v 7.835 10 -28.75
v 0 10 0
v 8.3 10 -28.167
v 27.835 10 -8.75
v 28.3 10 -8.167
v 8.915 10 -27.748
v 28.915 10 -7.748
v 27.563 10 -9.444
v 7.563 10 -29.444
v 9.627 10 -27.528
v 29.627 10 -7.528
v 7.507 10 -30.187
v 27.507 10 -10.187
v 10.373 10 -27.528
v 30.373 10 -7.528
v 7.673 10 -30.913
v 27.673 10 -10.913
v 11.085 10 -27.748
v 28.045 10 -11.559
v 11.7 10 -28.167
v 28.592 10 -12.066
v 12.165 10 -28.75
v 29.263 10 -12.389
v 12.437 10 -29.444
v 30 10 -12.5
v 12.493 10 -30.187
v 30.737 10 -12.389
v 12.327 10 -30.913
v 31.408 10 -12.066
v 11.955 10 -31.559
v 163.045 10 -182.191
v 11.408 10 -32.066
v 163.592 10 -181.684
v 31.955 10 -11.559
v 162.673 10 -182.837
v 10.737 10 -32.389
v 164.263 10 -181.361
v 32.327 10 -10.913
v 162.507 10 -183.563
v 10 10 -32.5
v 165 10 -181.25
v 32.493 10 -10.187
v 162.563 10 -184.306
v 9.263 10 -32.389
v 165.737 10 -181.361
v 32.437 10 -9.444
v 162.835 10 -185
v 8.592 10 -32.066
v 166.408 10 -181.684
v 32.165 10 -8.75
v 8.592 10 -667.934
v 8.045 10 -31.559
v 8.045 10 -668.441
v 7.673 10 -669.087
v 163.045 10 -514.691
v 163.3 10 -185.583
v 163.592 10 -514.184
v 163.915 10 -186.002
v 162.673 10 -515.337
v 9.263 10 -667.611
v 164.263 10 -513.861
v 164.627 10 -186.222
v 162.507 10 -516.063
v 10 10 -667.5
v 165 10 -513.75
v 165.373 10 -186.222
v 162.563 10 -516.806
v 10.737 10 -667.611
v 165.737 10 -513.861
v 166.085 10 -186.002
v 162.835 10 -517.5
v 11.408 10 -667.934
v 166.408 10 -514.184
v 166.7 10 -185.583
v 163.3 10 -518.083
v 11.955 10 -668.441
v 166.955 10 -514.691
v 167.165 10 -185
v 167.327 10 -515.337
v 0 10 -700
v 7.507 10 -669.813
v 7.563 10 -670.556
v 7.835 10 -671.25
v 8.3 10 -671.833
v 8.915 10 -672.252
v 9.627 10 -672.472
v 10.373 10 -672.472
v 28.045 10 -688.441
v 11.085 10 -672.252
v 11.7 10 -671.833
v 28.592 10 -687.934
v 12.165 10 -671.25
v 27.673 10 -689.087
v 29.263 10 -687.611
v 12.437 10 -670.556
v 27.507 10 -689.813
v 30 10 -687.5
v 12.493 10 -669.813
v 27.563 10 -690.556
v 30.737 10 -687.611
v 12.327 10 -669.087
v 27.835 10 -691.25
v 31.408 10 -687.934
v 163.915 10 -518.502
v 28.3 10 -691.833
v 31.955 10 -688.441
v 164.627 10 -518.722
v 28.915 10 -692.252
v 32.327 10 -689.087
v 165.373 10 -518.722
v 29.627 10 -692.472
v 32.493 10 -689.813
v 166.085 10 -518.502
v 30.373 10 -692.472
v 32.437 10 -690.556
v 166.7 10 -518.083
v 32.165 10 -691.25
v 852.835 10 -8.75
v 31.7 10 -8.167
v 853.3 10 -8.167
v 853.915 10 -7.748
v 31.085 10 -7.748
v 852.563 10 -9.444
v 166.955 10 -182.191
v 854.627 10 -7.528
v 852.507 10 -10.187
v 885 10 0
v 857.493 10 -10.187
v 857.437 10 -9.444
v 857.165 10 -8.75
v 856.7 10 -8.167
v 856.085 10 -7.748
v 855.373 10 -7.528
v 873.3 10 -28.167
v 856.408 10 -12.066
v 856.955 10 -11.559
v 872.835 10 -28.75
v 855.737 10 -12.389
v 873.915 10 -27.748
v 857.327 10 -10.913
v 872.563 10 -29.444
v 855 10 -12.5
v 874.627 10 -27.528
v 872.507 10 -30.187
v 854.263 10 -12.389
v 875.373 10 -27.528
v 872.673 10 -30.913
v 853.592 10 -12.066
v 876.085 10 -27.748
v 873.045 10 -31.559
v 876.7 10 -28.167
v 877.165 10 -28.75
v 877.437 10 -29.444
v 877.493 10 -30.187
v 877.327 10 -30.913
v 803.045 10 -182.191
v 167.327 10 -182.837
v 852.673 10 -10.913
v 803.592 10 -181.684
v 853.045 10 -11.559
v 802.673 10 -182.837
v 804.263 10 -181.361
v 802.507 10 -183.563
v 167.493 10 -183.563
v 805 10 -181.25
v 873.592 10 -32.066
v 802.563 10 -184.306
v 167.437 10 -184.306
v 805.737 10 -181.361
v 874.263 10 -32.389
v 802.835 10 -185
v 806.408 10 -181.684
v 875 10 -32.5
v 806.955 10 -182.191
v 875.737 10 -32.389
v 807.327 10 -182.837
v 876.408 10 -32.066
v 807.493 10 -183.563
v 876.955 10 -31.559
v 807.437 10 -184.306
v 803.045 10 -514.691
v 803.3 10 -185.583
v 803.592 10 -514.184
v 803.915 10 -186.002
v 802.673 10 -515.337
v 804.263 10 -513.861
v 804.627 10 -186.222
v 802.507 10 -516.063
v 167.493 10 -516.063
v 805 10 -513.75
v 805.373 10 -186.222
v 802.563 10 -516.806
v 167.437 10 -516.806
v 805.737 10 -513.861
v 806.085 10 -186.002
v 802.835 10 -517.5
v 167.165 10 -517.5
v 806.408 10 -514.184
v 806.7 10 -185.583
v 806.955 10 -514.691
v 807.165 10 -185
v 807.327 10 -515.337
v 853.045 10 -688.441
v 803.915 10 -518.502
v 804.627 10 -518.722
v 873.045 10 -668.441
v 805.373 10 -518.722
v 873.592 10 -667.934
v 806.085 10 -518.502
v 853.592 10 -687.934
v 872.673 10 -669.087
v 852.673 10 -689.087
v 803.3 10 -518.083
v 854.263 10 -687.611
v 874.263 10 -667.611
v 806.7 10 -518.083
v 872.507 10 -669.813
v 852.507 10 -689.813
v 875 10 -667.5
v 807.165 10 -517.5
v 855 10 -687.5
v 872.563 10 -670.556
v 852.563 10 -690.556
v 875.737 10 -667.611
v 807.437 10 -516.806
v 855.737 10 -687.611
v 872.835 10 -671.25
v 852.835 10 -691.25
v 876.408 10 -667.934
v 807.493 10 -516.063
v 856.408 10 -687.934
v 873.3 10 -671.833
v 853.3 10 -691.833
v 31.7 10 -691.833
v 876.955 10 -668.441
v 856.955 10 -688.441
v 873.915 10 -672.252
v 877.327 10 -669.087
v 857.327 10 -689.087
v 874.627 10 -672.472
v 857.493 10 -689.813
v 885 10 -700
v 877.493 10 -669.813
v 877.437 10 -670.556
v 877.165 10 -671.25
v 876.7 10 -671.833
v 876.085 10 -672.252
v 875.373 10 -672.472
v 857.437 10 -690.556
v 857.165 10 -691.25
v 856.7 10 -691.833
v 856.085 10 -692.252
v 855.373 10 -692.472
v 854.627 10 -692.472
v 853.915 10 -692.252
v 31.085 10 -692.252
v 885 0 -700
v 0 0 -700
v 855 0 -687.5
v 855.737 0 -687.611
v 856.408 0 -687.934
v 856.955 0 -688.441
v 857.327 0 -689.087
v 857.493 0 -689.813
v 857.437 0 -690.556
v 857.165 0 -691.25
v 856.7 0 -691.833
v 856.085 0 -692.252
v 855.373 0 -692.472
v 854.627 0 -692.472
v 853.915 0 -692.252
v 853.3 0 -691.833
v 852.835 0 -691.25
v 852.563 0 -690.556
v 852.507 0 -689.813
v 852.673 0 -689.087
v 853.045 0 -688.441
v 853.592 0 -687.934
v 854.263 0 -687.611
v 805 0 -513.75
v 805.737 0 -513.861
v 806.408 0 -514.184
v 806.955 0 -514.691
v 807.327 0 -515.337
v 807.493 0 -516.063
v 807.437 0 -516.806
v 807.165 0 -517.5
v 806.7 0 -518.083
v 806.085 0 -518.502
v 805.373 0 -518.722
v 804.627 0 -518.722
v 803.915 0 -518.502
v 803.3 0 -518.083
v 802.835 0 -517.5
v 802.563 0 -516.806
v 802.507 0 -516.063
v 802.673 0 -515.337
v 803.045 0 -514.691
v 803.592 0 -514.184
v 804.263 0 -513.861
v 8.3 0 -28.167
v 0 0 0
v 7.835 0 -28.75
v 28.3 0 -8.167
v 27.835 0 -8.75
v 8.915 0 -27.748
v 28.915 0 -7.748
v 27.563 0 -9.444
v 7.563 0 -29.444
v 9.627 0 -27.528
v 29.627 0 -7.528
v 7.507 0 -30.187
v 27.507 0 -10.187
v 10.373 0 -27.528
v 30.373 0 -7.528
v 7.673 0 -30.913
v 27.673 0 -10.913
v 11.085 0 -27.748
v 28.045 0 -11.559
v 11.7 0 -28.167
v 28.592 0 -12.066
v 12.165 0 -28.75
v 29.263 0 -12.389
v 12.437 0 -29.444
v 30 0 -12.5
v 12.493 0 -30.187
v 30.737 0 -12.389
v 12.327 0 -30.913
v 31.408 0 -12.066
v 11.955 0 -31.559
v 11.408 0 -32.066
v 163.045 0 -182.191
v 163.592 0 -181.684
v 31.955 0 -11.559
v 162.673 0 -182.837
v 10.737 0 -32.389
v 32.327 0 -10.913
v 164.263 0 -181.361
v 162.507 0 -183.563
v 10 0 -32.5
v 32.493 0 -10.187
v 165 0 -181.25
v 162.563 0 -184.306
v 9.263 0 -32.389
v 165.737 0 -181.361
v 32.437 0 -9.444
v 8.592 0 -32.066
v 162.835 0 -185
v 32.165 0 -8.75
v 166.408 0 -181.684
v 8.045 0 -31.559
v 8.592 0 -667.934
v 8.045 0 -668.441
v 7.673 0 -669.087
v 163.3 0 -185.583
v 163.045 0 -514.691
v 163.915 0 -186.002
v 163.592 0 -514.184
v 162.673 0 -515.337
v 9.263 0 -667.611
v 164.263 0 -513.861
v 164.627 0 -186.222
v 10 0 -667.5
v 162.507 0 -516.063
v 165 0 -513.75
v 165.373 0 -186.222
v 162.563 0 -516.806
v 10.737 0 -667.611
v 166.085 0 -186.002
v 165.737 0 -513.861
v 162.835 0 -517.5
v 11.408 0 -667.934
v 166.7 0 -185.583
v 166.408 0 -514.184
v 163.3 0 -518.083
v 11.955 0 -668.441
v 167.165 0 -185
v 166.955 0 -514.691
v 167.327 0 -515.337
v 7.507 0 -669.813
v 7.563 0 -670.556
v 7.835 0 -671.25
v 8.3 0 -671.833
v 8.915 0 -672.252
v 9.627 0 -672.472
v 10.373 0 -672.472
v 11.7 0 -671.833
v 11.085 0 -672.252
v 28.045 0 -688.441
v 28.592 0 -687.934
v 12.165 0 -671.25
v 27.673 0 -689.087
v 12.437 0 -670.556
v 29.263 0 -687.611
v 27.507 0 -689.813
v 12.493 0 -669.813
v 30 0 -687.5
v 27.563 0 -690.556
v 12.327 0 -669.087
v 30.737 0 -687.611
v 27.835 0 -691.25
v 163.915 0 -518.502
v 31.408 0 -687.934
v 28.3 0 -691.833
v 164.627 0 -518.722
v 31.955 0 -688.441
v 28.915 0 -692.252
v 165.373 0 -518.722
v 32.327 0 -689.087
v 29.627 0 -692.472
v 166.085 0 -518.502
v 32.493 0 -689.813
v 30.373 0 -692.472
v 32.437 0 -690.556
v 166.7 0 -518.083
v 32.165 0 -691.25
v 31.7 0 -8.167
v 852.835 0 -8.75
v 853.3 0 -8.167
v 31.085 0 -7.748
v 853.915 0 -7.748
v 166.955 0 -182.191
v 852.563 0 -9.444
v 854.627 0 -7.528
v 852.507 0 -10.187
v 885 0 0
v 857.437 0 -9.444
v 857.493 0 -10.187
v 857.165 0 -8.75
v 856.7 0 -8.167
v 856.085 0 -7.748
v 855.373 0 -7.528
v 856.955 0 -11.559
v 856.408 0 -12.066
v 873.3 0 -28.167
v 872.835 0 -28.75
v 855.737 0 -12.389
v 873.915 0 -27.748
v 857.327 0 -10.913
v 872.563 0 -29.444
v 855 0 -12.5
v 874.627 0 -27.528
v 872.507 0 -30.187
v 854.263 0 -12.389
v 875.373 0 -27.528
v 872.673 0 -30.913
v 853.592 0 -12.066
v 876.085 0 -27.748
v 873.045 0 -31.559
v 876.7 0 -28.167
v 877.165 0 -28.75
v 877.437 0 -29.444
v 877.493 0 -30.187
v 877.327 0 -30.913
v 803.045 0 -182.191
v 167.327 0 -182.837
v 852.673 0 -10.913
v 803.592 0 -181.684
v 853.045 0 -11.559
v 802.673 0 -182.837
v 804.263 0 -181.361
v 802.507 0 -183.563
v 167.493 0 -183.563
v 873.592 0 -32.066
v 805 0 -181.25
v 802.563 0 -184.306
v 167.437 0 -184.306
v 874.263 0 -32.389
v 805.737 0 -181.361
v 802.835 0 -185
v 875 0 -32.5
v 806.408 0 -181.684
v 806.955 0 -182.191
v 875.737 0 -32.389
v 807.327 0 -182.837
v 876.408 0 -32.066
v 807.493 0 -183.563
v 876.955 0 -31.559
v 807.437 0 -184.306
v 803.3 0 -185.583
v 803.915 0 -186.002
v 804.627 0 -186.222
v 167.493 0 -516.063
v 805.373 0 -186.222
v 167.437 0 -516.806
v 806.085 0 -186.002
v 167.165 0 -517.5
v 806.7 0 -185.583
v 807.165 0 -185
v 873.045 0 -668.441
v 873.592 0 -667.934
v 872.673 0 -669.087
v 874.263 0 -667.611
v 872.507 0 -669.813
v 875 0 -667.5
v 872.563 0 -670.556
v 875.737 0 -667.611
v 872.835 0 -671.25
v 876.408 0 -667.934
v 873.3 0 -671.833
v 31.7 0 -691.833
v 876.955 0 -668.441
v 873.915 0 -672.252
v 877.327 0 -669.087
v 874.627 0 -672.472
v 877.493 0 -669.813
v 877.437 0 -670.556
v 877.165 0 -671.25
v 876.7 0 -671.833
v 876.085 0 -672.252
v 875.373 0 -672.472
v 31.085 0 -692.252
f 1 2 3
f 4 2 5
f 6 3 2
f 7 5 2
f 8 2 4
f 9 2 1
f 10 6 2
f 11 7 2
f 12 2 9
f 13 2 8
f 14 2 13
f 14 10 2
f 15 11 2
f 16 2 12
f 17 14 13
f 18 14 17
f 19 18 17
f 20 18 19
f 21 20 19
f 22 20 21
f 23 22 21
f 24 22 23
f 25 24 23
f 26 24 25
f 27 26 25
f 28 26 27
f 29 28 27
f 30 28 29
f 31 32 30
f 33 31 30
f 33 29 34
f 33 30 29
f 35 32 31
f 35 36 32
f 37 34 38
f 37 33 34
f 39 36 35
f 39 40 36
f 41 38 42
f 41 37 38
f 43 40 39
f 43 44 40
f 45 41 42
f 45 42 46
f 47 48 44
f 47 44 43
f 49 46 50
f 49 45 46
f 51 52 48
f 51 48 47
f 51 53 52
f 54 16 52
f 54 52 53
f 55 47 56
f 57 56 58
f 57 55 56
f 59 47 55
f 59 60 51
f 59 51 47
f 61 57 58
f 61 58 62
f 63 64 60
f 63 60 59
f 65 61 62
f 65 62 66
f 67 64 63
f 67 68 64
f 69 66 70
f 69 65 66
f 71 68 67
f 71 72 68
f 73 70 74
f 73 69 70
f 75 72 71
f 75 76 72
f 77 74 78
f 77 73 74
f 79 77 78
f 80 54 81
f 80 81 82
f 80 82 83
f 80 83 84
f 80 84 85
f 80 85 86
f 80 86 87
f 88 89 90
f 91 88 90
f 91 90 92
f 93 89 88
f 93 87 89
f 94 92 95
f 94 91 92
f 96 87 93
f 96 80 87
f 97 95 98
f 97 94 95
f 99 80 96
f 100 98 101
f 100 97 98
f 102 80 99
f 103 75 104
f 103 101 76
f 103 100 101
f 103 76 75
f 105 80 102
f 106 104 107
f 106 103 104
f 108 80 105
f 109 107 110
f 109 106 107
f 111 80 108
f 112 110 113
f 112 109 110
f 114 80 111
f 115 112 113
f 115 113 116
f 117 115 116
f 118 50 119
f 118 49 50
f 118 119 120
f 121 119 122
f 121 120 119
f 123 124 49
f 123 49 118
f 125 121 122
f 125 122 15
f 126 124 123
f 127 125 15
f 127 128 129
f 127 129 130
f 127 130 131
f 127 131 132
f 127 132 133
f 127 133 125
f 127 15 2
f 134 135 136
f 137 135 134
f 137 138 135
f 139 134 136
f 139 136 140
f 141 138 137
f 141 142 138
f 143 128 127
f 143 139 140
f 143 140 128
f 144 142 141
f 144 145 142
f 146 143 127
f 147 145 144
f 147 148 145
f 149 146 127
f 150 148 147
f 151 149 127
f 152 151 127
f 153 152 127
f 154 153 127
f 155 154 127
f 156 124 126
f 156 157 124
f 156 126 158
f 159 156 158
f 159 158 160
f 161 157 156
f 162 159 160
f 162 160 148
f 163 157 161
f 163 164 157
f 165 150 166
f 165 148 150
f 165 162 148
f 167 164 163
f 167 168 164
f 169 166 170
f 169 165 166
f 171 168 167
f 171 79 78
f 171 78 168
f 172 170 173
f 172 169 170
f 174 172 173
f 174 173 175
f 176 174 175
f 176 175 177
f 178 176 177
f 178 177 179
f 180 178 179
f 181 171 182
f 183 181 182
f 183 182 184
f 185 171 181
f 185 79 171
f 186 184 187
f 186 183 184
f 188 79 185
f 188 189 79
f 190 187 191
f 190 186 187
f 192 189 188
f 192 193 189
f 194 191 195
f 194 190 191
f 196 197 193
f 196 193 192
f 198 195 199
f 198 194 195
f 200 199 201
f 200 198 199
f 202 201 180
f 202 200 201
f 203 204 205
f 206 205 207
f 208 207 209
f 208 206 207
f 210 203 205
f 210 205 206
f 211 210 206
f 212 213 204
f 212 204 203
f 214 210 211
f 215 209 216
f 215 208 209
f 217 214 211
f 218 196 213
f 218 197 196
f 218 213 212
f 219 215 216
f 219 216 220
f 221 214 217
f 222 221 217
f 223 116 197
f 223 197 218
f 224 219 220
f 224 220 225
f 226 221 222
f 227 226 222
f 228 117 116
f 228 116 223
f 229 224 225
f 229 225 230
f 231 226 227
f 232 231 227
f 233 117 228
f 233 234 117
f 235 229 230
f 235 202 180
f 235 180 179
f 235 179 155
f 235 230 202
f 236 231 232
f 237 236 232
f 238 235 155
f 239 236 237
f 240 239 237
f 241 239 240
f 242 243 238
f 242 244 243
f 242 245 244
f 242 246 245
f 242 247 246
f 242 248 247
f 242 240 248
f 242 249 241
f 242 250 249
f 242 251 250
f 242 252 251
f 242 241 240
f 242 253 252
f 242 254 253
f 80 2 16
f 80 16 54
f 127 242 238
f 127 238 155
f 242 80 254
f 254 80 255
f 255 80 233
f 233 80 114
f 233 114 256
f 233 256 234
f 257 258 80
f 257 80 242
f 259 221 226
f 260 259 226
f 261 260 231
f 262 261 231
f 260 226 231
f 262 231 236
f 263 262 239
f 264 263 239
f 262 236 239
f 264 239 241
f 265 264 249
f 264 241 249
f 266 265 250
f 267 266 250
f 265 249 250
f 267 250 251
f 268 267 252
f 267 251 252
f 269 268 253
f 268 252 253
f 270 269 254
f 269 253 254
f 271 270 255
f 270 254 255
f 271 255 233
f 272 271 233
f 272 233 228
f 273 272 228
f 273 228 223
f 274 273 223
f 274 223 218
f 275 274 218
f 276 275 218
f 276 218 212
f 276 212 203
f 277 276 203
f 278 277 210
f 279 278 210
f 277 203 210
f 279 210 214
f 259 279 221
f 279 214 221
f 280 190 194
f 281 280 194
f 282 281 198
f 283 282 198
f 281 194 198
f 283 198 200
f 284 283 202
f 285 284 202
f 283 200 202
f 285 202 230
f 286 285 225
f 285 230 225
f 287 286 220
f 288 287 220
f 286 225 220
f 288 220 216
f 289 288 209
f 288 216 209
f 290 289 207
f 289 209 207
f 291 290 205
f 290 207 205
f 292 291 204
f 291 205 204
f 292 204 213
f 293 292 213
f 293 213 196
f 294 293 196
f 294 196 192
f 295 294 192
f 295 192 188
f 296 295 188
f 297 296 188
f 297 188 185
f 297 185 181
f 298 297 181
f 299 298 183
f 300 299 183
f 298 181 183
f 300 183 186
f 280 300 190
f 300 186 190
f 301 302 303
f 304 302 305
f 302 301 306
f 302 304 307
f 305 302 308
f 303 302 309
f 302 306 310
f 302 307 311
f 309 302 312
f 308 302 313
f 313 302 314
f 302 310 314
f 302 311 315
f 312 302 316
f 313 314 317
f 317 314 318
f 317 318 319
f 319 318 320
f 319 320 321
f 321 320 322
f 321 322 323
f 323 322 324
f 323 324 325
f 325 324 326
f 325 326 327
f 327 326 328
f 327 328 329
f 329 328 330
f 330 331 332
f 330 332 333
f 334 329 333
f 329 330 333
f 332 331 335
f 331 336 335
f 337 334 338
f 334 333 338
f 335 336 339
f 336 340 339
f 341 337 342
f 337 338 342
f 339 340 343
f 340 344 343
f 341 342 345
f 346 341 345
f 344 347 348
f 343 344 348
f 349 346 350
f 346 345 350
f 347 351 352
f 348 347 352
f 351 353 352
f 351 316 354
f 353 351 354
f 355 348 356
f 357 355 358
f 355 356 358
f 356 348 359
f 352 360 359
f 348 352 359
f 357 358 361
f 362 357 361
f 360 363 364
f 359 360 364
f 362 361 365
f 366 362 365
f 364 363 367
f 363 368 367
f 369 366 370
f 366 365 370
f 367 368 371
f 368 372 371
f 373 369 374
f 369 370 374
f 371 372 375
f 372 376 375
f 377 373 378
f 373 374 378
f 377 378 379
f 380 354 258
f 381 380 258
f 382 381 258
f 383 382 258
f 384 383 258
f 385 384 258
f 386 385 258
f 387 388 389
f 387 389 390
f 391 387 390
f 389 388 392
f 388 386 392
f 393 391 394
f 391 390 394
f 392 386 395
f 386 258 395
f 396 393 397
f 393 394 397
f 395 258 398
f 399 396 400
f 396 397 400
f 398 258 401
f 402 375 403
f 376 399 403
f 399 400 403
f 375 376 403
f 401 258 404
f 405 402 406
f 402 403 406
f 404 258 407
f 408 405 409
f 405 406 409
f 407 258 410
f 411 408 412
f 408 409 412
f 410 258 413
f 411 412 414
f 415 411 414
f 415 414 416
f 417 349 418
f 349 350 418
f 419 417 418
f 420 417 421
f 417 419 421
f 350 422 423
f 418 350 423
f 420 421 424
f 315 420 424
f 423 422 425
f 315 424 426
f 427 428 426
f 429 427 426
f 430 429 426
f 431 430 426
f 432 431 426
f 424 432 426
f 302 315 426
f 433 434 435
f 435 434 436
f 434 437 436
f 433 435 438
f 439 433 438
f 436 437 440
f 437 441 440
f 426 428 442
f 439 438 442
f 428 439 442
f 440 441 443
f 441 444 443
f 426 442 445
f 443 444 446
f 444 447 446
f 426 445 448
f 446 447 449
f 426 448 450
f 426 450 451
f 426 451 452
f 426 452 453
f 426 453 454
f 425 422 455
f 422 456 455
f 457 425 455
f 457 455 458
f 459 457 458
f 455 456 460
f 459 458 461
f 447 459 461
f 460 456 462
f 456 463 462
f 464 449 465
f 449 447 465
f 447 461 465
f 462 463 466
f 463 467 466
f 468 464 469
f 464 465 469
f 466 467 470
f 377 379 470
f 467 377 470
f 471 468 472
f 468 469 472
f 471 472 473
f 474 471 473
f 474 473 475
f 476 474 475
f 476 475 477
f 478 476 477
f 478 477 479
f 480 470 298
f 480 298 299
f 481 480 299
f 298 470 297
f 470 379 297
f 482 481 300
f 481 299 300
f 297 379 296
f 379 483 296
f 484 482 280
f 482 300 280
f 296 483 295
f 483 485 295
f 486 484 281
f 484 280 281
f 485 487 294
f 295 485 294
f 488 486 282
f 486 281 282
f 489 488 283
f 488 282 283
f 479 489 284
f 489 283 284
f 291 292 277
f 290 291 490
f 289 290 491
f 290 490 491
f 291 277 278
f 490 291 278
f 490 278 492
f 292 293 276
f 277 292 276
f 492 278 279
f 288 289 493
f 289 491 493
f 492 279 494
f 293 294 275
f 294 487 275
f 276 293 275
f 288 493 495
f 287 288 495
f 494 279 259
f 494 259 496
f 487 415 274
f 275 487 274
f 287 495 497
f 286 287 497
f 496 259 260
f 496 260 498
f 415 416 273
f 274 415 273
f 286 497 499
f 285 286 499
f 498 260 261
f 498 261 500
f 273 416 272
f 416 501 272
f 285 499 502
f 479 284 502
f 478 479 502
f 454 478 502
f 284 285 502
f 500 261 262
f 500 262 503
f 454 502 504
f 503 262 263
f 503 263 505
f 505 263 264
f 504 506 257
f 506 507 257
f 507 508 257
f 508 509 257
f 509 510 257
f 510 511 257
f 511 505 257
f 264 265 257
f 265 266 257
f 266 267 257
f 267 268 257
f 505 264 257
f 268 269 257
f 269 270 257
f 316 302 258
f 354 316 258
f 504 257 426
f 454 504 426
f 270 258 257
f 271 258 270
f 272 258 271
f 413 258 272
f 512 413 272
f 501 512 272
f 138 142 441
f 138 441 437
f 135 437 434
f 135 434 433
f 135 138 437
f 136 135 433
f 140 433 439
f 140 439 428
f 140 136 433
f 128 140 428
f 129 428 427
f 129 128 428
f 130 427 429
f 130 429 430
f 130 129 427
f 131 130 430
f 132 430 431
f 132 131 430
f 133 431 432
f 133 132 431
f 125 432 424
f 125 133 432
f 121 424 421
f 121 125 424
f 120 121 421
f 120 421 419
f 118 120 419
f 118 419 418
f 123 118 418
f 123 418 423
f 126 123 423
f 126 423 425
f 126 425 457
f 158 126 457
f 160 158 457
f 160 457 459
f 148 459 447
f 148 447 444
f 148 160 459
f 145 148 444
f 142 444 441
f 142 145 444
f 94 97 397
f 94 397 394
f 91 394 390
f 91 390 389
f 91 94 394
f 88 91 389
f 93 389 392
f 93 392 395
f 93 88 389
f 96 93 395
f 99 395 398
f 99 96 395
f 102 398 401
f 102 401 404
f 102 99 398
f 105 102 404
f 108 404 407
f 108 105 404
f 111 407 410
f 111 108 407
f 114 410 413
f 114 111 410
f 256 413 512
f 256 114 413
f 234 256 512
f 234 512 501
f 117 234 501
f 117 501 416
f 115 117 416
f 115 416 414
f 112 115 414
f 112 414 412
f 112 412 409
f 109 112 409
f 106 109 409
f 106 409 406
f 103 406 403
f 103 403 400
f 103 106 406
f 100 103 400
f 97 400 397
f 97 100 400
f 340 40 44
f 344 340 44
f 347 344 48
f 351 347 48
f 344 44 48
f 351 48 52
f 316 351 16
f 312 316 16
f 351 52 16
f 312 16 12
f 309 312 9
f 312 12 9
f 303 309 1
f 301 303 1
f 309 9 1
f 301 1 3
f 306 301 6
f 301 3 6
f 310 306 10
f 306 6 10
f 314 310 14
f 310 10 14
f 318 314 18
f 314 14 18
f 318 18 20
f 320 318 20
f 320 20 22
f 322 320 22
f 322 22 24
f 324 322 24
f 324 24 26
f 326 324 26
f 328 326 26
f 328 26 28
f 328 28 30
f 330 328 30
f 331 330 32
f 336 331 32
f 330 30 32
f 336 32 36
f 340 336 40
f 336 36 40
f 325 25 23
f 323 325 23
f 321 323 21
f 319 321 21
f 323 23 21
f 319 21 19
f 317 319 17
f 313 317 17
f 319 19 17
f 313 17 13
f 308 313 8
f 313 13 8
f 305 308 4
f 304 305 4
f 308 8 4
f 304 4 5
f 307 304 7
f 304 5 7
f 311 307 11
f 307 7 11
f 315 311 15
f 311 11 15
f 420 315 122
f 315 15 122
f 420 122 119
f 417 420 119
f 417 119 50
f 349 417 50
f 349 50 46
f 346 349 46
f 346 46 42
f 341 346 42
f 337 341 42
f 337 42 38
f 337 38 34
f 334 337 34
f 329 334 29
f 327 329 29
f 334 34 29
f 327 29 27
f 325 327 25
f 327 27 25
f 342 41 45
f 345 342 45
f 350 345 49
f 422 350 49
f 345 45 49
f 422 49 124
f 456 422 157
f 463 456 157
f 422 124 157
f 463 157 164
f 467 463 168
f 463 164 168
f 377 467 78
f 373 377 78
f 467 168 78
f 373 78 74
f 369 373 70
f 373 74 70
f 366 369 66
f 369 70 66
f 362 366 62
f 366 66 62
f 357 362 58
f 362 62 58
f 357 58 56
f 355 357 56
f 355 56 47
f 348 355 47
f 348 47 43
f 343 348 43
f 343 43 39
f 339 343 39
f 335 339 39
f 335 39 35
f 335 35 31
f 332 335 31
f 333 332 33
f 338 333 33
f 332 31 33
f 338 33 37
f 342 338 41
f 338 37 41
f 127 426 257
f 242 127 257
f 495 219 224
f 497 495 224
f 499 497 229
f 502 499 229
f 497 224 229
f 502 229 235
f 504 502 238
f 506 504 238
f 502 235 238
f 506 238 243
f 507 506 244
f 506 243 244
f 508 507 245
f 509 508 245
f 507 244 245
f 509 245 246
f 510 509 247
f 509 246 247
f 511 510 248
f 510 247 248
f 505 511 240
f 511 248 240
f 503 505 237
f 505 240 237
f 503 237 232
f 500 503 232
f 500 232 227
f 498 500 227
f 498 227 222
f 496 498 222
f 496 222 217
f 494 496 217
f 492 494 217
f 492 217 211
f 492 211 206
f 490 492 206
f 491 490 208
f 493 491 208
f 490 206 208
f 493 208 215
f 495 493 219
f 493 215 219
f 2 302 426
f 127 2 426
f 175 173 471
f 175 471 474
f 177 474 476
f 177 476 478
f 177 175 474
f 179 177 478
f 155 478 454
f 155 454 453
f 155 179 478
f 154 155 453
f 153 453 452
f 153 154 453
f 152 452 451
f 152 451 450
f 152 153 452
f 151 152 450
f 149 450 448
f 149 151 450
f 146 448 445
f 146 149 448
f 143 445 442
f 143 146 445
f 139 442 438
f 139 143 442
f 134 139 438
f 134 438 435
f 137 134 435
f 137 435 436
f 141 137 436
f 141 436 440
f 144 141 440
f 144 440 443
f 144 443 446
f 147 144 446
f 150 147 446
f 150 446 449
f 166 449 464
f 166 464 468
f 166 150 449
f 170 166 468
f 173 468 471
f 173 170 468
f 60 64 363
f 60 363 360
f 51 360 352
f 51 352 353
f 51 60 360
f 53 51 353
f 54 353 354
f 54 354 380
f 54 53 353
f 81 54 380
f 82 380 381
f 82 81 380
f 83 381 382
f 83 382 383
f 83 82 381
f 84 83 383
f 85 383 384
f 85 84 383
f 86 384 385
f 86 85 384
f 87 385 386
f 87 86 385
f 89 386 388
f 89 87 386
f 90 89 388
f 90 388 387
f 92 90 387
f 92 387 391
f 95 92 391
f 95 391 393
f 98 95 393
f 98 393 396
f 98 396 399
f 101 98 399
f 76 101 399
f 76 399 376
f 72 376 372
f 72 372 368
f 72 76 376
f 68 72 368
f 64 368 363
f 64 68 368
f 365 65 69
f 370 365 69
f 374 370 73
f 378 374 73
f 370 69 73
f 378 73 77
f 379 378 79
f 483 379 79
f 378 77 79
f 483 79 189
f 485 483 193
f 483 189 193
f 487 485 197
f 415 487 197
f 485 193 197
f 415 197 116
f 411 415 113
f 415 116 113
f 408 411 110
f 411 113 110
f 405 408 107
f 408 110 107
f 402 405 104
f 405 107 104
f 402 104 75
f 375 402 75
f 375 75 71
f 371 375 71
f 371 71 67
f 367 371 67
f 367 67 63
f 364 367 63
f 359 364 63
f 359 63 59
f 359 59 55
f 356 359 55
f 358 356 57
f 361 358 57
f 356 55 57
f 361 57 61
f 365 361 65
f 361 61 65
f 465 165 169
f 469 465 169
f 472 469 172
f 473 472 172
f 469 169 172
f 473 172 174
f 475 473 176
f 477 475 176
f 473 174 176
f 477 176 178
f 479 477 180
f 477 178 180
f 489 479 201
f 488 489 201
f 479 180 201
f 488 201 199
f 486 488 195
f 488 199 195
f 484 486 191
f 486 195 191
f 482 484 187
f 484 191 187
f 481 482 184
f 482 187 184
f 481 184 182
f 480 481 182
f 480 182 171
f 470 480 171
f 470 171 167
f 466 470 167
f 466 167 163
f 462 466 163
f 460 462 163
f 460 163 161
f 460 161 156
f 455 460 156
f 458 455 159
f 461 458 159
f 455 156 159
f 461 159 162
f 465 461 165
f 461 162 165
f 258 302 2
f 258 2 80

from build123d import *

# Parameters (mm, degrees)
SKETCH1_W               = 885
SKETCH1_H               = 700
BOSS_EXTRUDE1_DEPTH     = 10
SKETCH2_R               = 2.5
CUT_EXTRUDE1_DEPTH      = 10
SKETCH4_R               = 2.5
CUT_EXTRUDE2_DEPTH      = 10
MIRROR2_COPY_1_SKETCH_R = 2.5
MIRROR2_COPY_1_DEPTH    = 10


with BuildPart() as part:
    # Sketch1 → Boss-Extrude1 (new body)
    with BuildSketch(Plane(origin=(0, 0, 0), x_dir=(1, 0, 0), z_dir=(0, 1, 0))):
        with Locations((442.5, 350)):
            Rectangle(SKETCH1_W, SKETCH1_H)
    extrude(amount=BOSS_EXTRUDE1_DEPTH)

    # Sketch2 → Cut-Extrude1 (cut)
    with BuildSketch(Plane(origin=(0, 10, 0), x_dir=(1, 0, 0), z_dir=(0, 1, 0))):
        with Locations(Location((805, 183.75, 0), (0, 0, 270))):
            Circle(SKETCH2_R)
        with Locations(Location((805, 516.25, 0), (0, 0, 270))):
            Circle(SKETCH2_R)
        with Locations(Location((165, 183.75, 0), (0, 0, 270))):
            Circle(SKETCH2_R)
        with Locations(Location((165, 516.25, 0), (0, 0, 270))):
            Circle(SKETCH2_R)
    extrude(amount=-CUT_EXTRUDE1_DEPTH, mode=Mode.SUBTRACT)

    # Sketch4 → Cut-Extrude2 (cut)
    with BuildSketch(Plane(origin=(0, 10, 0), x_dir=(1, 0, 0), z_dir=(0, 1, 0))):
        with Locations(Location((875, 670, 0), (0, 0, 270))):
            Circle(SKETCH4_R)
        with Locations(Location((855, 690, 0), (0, 0, 270))):
            Circle(SKETCH4_R)
    cut_extrude2 = extrude(amount=-CUT_EXTRUDE2_DEPTH, mode=Mode.SUBTRACT)

    # Mirror1: Cut-Extrude2 across plane
    add(cut_extrude2.mirror(Plane.XY.offset(-350)), mode=Mode.SUBTRACT)

    # Mirror2: Cut-Extrude2 across plane
    add(cut_extrude2.mirror(Plane.ZY.offset(-442.5)), mode=Mode.SUBTRACT)

    # Mirror2 copy 1 sketch → Mirror2 copy 1 (cut)
    with BuildSketch(Plane(origin=(885, 10, -700), x_dir=(-1, 0, 0), z_dir=(0, 1, 0))):
        with Locations(Location((875, 670, 0), (0, 0, 270))):
            Circle(MIRROR2_COPY_1_SKETCH_R)
        with Locations(Location((855, 690, 0), (0, 0, 270))):
            Circle(MIRROR2_COPY_1_SKETCH_R)
    extrude(amount=-MIRROR2_COPY_1_DEPTH, mode=Mode.SUBTRACT)


solid = part.part
